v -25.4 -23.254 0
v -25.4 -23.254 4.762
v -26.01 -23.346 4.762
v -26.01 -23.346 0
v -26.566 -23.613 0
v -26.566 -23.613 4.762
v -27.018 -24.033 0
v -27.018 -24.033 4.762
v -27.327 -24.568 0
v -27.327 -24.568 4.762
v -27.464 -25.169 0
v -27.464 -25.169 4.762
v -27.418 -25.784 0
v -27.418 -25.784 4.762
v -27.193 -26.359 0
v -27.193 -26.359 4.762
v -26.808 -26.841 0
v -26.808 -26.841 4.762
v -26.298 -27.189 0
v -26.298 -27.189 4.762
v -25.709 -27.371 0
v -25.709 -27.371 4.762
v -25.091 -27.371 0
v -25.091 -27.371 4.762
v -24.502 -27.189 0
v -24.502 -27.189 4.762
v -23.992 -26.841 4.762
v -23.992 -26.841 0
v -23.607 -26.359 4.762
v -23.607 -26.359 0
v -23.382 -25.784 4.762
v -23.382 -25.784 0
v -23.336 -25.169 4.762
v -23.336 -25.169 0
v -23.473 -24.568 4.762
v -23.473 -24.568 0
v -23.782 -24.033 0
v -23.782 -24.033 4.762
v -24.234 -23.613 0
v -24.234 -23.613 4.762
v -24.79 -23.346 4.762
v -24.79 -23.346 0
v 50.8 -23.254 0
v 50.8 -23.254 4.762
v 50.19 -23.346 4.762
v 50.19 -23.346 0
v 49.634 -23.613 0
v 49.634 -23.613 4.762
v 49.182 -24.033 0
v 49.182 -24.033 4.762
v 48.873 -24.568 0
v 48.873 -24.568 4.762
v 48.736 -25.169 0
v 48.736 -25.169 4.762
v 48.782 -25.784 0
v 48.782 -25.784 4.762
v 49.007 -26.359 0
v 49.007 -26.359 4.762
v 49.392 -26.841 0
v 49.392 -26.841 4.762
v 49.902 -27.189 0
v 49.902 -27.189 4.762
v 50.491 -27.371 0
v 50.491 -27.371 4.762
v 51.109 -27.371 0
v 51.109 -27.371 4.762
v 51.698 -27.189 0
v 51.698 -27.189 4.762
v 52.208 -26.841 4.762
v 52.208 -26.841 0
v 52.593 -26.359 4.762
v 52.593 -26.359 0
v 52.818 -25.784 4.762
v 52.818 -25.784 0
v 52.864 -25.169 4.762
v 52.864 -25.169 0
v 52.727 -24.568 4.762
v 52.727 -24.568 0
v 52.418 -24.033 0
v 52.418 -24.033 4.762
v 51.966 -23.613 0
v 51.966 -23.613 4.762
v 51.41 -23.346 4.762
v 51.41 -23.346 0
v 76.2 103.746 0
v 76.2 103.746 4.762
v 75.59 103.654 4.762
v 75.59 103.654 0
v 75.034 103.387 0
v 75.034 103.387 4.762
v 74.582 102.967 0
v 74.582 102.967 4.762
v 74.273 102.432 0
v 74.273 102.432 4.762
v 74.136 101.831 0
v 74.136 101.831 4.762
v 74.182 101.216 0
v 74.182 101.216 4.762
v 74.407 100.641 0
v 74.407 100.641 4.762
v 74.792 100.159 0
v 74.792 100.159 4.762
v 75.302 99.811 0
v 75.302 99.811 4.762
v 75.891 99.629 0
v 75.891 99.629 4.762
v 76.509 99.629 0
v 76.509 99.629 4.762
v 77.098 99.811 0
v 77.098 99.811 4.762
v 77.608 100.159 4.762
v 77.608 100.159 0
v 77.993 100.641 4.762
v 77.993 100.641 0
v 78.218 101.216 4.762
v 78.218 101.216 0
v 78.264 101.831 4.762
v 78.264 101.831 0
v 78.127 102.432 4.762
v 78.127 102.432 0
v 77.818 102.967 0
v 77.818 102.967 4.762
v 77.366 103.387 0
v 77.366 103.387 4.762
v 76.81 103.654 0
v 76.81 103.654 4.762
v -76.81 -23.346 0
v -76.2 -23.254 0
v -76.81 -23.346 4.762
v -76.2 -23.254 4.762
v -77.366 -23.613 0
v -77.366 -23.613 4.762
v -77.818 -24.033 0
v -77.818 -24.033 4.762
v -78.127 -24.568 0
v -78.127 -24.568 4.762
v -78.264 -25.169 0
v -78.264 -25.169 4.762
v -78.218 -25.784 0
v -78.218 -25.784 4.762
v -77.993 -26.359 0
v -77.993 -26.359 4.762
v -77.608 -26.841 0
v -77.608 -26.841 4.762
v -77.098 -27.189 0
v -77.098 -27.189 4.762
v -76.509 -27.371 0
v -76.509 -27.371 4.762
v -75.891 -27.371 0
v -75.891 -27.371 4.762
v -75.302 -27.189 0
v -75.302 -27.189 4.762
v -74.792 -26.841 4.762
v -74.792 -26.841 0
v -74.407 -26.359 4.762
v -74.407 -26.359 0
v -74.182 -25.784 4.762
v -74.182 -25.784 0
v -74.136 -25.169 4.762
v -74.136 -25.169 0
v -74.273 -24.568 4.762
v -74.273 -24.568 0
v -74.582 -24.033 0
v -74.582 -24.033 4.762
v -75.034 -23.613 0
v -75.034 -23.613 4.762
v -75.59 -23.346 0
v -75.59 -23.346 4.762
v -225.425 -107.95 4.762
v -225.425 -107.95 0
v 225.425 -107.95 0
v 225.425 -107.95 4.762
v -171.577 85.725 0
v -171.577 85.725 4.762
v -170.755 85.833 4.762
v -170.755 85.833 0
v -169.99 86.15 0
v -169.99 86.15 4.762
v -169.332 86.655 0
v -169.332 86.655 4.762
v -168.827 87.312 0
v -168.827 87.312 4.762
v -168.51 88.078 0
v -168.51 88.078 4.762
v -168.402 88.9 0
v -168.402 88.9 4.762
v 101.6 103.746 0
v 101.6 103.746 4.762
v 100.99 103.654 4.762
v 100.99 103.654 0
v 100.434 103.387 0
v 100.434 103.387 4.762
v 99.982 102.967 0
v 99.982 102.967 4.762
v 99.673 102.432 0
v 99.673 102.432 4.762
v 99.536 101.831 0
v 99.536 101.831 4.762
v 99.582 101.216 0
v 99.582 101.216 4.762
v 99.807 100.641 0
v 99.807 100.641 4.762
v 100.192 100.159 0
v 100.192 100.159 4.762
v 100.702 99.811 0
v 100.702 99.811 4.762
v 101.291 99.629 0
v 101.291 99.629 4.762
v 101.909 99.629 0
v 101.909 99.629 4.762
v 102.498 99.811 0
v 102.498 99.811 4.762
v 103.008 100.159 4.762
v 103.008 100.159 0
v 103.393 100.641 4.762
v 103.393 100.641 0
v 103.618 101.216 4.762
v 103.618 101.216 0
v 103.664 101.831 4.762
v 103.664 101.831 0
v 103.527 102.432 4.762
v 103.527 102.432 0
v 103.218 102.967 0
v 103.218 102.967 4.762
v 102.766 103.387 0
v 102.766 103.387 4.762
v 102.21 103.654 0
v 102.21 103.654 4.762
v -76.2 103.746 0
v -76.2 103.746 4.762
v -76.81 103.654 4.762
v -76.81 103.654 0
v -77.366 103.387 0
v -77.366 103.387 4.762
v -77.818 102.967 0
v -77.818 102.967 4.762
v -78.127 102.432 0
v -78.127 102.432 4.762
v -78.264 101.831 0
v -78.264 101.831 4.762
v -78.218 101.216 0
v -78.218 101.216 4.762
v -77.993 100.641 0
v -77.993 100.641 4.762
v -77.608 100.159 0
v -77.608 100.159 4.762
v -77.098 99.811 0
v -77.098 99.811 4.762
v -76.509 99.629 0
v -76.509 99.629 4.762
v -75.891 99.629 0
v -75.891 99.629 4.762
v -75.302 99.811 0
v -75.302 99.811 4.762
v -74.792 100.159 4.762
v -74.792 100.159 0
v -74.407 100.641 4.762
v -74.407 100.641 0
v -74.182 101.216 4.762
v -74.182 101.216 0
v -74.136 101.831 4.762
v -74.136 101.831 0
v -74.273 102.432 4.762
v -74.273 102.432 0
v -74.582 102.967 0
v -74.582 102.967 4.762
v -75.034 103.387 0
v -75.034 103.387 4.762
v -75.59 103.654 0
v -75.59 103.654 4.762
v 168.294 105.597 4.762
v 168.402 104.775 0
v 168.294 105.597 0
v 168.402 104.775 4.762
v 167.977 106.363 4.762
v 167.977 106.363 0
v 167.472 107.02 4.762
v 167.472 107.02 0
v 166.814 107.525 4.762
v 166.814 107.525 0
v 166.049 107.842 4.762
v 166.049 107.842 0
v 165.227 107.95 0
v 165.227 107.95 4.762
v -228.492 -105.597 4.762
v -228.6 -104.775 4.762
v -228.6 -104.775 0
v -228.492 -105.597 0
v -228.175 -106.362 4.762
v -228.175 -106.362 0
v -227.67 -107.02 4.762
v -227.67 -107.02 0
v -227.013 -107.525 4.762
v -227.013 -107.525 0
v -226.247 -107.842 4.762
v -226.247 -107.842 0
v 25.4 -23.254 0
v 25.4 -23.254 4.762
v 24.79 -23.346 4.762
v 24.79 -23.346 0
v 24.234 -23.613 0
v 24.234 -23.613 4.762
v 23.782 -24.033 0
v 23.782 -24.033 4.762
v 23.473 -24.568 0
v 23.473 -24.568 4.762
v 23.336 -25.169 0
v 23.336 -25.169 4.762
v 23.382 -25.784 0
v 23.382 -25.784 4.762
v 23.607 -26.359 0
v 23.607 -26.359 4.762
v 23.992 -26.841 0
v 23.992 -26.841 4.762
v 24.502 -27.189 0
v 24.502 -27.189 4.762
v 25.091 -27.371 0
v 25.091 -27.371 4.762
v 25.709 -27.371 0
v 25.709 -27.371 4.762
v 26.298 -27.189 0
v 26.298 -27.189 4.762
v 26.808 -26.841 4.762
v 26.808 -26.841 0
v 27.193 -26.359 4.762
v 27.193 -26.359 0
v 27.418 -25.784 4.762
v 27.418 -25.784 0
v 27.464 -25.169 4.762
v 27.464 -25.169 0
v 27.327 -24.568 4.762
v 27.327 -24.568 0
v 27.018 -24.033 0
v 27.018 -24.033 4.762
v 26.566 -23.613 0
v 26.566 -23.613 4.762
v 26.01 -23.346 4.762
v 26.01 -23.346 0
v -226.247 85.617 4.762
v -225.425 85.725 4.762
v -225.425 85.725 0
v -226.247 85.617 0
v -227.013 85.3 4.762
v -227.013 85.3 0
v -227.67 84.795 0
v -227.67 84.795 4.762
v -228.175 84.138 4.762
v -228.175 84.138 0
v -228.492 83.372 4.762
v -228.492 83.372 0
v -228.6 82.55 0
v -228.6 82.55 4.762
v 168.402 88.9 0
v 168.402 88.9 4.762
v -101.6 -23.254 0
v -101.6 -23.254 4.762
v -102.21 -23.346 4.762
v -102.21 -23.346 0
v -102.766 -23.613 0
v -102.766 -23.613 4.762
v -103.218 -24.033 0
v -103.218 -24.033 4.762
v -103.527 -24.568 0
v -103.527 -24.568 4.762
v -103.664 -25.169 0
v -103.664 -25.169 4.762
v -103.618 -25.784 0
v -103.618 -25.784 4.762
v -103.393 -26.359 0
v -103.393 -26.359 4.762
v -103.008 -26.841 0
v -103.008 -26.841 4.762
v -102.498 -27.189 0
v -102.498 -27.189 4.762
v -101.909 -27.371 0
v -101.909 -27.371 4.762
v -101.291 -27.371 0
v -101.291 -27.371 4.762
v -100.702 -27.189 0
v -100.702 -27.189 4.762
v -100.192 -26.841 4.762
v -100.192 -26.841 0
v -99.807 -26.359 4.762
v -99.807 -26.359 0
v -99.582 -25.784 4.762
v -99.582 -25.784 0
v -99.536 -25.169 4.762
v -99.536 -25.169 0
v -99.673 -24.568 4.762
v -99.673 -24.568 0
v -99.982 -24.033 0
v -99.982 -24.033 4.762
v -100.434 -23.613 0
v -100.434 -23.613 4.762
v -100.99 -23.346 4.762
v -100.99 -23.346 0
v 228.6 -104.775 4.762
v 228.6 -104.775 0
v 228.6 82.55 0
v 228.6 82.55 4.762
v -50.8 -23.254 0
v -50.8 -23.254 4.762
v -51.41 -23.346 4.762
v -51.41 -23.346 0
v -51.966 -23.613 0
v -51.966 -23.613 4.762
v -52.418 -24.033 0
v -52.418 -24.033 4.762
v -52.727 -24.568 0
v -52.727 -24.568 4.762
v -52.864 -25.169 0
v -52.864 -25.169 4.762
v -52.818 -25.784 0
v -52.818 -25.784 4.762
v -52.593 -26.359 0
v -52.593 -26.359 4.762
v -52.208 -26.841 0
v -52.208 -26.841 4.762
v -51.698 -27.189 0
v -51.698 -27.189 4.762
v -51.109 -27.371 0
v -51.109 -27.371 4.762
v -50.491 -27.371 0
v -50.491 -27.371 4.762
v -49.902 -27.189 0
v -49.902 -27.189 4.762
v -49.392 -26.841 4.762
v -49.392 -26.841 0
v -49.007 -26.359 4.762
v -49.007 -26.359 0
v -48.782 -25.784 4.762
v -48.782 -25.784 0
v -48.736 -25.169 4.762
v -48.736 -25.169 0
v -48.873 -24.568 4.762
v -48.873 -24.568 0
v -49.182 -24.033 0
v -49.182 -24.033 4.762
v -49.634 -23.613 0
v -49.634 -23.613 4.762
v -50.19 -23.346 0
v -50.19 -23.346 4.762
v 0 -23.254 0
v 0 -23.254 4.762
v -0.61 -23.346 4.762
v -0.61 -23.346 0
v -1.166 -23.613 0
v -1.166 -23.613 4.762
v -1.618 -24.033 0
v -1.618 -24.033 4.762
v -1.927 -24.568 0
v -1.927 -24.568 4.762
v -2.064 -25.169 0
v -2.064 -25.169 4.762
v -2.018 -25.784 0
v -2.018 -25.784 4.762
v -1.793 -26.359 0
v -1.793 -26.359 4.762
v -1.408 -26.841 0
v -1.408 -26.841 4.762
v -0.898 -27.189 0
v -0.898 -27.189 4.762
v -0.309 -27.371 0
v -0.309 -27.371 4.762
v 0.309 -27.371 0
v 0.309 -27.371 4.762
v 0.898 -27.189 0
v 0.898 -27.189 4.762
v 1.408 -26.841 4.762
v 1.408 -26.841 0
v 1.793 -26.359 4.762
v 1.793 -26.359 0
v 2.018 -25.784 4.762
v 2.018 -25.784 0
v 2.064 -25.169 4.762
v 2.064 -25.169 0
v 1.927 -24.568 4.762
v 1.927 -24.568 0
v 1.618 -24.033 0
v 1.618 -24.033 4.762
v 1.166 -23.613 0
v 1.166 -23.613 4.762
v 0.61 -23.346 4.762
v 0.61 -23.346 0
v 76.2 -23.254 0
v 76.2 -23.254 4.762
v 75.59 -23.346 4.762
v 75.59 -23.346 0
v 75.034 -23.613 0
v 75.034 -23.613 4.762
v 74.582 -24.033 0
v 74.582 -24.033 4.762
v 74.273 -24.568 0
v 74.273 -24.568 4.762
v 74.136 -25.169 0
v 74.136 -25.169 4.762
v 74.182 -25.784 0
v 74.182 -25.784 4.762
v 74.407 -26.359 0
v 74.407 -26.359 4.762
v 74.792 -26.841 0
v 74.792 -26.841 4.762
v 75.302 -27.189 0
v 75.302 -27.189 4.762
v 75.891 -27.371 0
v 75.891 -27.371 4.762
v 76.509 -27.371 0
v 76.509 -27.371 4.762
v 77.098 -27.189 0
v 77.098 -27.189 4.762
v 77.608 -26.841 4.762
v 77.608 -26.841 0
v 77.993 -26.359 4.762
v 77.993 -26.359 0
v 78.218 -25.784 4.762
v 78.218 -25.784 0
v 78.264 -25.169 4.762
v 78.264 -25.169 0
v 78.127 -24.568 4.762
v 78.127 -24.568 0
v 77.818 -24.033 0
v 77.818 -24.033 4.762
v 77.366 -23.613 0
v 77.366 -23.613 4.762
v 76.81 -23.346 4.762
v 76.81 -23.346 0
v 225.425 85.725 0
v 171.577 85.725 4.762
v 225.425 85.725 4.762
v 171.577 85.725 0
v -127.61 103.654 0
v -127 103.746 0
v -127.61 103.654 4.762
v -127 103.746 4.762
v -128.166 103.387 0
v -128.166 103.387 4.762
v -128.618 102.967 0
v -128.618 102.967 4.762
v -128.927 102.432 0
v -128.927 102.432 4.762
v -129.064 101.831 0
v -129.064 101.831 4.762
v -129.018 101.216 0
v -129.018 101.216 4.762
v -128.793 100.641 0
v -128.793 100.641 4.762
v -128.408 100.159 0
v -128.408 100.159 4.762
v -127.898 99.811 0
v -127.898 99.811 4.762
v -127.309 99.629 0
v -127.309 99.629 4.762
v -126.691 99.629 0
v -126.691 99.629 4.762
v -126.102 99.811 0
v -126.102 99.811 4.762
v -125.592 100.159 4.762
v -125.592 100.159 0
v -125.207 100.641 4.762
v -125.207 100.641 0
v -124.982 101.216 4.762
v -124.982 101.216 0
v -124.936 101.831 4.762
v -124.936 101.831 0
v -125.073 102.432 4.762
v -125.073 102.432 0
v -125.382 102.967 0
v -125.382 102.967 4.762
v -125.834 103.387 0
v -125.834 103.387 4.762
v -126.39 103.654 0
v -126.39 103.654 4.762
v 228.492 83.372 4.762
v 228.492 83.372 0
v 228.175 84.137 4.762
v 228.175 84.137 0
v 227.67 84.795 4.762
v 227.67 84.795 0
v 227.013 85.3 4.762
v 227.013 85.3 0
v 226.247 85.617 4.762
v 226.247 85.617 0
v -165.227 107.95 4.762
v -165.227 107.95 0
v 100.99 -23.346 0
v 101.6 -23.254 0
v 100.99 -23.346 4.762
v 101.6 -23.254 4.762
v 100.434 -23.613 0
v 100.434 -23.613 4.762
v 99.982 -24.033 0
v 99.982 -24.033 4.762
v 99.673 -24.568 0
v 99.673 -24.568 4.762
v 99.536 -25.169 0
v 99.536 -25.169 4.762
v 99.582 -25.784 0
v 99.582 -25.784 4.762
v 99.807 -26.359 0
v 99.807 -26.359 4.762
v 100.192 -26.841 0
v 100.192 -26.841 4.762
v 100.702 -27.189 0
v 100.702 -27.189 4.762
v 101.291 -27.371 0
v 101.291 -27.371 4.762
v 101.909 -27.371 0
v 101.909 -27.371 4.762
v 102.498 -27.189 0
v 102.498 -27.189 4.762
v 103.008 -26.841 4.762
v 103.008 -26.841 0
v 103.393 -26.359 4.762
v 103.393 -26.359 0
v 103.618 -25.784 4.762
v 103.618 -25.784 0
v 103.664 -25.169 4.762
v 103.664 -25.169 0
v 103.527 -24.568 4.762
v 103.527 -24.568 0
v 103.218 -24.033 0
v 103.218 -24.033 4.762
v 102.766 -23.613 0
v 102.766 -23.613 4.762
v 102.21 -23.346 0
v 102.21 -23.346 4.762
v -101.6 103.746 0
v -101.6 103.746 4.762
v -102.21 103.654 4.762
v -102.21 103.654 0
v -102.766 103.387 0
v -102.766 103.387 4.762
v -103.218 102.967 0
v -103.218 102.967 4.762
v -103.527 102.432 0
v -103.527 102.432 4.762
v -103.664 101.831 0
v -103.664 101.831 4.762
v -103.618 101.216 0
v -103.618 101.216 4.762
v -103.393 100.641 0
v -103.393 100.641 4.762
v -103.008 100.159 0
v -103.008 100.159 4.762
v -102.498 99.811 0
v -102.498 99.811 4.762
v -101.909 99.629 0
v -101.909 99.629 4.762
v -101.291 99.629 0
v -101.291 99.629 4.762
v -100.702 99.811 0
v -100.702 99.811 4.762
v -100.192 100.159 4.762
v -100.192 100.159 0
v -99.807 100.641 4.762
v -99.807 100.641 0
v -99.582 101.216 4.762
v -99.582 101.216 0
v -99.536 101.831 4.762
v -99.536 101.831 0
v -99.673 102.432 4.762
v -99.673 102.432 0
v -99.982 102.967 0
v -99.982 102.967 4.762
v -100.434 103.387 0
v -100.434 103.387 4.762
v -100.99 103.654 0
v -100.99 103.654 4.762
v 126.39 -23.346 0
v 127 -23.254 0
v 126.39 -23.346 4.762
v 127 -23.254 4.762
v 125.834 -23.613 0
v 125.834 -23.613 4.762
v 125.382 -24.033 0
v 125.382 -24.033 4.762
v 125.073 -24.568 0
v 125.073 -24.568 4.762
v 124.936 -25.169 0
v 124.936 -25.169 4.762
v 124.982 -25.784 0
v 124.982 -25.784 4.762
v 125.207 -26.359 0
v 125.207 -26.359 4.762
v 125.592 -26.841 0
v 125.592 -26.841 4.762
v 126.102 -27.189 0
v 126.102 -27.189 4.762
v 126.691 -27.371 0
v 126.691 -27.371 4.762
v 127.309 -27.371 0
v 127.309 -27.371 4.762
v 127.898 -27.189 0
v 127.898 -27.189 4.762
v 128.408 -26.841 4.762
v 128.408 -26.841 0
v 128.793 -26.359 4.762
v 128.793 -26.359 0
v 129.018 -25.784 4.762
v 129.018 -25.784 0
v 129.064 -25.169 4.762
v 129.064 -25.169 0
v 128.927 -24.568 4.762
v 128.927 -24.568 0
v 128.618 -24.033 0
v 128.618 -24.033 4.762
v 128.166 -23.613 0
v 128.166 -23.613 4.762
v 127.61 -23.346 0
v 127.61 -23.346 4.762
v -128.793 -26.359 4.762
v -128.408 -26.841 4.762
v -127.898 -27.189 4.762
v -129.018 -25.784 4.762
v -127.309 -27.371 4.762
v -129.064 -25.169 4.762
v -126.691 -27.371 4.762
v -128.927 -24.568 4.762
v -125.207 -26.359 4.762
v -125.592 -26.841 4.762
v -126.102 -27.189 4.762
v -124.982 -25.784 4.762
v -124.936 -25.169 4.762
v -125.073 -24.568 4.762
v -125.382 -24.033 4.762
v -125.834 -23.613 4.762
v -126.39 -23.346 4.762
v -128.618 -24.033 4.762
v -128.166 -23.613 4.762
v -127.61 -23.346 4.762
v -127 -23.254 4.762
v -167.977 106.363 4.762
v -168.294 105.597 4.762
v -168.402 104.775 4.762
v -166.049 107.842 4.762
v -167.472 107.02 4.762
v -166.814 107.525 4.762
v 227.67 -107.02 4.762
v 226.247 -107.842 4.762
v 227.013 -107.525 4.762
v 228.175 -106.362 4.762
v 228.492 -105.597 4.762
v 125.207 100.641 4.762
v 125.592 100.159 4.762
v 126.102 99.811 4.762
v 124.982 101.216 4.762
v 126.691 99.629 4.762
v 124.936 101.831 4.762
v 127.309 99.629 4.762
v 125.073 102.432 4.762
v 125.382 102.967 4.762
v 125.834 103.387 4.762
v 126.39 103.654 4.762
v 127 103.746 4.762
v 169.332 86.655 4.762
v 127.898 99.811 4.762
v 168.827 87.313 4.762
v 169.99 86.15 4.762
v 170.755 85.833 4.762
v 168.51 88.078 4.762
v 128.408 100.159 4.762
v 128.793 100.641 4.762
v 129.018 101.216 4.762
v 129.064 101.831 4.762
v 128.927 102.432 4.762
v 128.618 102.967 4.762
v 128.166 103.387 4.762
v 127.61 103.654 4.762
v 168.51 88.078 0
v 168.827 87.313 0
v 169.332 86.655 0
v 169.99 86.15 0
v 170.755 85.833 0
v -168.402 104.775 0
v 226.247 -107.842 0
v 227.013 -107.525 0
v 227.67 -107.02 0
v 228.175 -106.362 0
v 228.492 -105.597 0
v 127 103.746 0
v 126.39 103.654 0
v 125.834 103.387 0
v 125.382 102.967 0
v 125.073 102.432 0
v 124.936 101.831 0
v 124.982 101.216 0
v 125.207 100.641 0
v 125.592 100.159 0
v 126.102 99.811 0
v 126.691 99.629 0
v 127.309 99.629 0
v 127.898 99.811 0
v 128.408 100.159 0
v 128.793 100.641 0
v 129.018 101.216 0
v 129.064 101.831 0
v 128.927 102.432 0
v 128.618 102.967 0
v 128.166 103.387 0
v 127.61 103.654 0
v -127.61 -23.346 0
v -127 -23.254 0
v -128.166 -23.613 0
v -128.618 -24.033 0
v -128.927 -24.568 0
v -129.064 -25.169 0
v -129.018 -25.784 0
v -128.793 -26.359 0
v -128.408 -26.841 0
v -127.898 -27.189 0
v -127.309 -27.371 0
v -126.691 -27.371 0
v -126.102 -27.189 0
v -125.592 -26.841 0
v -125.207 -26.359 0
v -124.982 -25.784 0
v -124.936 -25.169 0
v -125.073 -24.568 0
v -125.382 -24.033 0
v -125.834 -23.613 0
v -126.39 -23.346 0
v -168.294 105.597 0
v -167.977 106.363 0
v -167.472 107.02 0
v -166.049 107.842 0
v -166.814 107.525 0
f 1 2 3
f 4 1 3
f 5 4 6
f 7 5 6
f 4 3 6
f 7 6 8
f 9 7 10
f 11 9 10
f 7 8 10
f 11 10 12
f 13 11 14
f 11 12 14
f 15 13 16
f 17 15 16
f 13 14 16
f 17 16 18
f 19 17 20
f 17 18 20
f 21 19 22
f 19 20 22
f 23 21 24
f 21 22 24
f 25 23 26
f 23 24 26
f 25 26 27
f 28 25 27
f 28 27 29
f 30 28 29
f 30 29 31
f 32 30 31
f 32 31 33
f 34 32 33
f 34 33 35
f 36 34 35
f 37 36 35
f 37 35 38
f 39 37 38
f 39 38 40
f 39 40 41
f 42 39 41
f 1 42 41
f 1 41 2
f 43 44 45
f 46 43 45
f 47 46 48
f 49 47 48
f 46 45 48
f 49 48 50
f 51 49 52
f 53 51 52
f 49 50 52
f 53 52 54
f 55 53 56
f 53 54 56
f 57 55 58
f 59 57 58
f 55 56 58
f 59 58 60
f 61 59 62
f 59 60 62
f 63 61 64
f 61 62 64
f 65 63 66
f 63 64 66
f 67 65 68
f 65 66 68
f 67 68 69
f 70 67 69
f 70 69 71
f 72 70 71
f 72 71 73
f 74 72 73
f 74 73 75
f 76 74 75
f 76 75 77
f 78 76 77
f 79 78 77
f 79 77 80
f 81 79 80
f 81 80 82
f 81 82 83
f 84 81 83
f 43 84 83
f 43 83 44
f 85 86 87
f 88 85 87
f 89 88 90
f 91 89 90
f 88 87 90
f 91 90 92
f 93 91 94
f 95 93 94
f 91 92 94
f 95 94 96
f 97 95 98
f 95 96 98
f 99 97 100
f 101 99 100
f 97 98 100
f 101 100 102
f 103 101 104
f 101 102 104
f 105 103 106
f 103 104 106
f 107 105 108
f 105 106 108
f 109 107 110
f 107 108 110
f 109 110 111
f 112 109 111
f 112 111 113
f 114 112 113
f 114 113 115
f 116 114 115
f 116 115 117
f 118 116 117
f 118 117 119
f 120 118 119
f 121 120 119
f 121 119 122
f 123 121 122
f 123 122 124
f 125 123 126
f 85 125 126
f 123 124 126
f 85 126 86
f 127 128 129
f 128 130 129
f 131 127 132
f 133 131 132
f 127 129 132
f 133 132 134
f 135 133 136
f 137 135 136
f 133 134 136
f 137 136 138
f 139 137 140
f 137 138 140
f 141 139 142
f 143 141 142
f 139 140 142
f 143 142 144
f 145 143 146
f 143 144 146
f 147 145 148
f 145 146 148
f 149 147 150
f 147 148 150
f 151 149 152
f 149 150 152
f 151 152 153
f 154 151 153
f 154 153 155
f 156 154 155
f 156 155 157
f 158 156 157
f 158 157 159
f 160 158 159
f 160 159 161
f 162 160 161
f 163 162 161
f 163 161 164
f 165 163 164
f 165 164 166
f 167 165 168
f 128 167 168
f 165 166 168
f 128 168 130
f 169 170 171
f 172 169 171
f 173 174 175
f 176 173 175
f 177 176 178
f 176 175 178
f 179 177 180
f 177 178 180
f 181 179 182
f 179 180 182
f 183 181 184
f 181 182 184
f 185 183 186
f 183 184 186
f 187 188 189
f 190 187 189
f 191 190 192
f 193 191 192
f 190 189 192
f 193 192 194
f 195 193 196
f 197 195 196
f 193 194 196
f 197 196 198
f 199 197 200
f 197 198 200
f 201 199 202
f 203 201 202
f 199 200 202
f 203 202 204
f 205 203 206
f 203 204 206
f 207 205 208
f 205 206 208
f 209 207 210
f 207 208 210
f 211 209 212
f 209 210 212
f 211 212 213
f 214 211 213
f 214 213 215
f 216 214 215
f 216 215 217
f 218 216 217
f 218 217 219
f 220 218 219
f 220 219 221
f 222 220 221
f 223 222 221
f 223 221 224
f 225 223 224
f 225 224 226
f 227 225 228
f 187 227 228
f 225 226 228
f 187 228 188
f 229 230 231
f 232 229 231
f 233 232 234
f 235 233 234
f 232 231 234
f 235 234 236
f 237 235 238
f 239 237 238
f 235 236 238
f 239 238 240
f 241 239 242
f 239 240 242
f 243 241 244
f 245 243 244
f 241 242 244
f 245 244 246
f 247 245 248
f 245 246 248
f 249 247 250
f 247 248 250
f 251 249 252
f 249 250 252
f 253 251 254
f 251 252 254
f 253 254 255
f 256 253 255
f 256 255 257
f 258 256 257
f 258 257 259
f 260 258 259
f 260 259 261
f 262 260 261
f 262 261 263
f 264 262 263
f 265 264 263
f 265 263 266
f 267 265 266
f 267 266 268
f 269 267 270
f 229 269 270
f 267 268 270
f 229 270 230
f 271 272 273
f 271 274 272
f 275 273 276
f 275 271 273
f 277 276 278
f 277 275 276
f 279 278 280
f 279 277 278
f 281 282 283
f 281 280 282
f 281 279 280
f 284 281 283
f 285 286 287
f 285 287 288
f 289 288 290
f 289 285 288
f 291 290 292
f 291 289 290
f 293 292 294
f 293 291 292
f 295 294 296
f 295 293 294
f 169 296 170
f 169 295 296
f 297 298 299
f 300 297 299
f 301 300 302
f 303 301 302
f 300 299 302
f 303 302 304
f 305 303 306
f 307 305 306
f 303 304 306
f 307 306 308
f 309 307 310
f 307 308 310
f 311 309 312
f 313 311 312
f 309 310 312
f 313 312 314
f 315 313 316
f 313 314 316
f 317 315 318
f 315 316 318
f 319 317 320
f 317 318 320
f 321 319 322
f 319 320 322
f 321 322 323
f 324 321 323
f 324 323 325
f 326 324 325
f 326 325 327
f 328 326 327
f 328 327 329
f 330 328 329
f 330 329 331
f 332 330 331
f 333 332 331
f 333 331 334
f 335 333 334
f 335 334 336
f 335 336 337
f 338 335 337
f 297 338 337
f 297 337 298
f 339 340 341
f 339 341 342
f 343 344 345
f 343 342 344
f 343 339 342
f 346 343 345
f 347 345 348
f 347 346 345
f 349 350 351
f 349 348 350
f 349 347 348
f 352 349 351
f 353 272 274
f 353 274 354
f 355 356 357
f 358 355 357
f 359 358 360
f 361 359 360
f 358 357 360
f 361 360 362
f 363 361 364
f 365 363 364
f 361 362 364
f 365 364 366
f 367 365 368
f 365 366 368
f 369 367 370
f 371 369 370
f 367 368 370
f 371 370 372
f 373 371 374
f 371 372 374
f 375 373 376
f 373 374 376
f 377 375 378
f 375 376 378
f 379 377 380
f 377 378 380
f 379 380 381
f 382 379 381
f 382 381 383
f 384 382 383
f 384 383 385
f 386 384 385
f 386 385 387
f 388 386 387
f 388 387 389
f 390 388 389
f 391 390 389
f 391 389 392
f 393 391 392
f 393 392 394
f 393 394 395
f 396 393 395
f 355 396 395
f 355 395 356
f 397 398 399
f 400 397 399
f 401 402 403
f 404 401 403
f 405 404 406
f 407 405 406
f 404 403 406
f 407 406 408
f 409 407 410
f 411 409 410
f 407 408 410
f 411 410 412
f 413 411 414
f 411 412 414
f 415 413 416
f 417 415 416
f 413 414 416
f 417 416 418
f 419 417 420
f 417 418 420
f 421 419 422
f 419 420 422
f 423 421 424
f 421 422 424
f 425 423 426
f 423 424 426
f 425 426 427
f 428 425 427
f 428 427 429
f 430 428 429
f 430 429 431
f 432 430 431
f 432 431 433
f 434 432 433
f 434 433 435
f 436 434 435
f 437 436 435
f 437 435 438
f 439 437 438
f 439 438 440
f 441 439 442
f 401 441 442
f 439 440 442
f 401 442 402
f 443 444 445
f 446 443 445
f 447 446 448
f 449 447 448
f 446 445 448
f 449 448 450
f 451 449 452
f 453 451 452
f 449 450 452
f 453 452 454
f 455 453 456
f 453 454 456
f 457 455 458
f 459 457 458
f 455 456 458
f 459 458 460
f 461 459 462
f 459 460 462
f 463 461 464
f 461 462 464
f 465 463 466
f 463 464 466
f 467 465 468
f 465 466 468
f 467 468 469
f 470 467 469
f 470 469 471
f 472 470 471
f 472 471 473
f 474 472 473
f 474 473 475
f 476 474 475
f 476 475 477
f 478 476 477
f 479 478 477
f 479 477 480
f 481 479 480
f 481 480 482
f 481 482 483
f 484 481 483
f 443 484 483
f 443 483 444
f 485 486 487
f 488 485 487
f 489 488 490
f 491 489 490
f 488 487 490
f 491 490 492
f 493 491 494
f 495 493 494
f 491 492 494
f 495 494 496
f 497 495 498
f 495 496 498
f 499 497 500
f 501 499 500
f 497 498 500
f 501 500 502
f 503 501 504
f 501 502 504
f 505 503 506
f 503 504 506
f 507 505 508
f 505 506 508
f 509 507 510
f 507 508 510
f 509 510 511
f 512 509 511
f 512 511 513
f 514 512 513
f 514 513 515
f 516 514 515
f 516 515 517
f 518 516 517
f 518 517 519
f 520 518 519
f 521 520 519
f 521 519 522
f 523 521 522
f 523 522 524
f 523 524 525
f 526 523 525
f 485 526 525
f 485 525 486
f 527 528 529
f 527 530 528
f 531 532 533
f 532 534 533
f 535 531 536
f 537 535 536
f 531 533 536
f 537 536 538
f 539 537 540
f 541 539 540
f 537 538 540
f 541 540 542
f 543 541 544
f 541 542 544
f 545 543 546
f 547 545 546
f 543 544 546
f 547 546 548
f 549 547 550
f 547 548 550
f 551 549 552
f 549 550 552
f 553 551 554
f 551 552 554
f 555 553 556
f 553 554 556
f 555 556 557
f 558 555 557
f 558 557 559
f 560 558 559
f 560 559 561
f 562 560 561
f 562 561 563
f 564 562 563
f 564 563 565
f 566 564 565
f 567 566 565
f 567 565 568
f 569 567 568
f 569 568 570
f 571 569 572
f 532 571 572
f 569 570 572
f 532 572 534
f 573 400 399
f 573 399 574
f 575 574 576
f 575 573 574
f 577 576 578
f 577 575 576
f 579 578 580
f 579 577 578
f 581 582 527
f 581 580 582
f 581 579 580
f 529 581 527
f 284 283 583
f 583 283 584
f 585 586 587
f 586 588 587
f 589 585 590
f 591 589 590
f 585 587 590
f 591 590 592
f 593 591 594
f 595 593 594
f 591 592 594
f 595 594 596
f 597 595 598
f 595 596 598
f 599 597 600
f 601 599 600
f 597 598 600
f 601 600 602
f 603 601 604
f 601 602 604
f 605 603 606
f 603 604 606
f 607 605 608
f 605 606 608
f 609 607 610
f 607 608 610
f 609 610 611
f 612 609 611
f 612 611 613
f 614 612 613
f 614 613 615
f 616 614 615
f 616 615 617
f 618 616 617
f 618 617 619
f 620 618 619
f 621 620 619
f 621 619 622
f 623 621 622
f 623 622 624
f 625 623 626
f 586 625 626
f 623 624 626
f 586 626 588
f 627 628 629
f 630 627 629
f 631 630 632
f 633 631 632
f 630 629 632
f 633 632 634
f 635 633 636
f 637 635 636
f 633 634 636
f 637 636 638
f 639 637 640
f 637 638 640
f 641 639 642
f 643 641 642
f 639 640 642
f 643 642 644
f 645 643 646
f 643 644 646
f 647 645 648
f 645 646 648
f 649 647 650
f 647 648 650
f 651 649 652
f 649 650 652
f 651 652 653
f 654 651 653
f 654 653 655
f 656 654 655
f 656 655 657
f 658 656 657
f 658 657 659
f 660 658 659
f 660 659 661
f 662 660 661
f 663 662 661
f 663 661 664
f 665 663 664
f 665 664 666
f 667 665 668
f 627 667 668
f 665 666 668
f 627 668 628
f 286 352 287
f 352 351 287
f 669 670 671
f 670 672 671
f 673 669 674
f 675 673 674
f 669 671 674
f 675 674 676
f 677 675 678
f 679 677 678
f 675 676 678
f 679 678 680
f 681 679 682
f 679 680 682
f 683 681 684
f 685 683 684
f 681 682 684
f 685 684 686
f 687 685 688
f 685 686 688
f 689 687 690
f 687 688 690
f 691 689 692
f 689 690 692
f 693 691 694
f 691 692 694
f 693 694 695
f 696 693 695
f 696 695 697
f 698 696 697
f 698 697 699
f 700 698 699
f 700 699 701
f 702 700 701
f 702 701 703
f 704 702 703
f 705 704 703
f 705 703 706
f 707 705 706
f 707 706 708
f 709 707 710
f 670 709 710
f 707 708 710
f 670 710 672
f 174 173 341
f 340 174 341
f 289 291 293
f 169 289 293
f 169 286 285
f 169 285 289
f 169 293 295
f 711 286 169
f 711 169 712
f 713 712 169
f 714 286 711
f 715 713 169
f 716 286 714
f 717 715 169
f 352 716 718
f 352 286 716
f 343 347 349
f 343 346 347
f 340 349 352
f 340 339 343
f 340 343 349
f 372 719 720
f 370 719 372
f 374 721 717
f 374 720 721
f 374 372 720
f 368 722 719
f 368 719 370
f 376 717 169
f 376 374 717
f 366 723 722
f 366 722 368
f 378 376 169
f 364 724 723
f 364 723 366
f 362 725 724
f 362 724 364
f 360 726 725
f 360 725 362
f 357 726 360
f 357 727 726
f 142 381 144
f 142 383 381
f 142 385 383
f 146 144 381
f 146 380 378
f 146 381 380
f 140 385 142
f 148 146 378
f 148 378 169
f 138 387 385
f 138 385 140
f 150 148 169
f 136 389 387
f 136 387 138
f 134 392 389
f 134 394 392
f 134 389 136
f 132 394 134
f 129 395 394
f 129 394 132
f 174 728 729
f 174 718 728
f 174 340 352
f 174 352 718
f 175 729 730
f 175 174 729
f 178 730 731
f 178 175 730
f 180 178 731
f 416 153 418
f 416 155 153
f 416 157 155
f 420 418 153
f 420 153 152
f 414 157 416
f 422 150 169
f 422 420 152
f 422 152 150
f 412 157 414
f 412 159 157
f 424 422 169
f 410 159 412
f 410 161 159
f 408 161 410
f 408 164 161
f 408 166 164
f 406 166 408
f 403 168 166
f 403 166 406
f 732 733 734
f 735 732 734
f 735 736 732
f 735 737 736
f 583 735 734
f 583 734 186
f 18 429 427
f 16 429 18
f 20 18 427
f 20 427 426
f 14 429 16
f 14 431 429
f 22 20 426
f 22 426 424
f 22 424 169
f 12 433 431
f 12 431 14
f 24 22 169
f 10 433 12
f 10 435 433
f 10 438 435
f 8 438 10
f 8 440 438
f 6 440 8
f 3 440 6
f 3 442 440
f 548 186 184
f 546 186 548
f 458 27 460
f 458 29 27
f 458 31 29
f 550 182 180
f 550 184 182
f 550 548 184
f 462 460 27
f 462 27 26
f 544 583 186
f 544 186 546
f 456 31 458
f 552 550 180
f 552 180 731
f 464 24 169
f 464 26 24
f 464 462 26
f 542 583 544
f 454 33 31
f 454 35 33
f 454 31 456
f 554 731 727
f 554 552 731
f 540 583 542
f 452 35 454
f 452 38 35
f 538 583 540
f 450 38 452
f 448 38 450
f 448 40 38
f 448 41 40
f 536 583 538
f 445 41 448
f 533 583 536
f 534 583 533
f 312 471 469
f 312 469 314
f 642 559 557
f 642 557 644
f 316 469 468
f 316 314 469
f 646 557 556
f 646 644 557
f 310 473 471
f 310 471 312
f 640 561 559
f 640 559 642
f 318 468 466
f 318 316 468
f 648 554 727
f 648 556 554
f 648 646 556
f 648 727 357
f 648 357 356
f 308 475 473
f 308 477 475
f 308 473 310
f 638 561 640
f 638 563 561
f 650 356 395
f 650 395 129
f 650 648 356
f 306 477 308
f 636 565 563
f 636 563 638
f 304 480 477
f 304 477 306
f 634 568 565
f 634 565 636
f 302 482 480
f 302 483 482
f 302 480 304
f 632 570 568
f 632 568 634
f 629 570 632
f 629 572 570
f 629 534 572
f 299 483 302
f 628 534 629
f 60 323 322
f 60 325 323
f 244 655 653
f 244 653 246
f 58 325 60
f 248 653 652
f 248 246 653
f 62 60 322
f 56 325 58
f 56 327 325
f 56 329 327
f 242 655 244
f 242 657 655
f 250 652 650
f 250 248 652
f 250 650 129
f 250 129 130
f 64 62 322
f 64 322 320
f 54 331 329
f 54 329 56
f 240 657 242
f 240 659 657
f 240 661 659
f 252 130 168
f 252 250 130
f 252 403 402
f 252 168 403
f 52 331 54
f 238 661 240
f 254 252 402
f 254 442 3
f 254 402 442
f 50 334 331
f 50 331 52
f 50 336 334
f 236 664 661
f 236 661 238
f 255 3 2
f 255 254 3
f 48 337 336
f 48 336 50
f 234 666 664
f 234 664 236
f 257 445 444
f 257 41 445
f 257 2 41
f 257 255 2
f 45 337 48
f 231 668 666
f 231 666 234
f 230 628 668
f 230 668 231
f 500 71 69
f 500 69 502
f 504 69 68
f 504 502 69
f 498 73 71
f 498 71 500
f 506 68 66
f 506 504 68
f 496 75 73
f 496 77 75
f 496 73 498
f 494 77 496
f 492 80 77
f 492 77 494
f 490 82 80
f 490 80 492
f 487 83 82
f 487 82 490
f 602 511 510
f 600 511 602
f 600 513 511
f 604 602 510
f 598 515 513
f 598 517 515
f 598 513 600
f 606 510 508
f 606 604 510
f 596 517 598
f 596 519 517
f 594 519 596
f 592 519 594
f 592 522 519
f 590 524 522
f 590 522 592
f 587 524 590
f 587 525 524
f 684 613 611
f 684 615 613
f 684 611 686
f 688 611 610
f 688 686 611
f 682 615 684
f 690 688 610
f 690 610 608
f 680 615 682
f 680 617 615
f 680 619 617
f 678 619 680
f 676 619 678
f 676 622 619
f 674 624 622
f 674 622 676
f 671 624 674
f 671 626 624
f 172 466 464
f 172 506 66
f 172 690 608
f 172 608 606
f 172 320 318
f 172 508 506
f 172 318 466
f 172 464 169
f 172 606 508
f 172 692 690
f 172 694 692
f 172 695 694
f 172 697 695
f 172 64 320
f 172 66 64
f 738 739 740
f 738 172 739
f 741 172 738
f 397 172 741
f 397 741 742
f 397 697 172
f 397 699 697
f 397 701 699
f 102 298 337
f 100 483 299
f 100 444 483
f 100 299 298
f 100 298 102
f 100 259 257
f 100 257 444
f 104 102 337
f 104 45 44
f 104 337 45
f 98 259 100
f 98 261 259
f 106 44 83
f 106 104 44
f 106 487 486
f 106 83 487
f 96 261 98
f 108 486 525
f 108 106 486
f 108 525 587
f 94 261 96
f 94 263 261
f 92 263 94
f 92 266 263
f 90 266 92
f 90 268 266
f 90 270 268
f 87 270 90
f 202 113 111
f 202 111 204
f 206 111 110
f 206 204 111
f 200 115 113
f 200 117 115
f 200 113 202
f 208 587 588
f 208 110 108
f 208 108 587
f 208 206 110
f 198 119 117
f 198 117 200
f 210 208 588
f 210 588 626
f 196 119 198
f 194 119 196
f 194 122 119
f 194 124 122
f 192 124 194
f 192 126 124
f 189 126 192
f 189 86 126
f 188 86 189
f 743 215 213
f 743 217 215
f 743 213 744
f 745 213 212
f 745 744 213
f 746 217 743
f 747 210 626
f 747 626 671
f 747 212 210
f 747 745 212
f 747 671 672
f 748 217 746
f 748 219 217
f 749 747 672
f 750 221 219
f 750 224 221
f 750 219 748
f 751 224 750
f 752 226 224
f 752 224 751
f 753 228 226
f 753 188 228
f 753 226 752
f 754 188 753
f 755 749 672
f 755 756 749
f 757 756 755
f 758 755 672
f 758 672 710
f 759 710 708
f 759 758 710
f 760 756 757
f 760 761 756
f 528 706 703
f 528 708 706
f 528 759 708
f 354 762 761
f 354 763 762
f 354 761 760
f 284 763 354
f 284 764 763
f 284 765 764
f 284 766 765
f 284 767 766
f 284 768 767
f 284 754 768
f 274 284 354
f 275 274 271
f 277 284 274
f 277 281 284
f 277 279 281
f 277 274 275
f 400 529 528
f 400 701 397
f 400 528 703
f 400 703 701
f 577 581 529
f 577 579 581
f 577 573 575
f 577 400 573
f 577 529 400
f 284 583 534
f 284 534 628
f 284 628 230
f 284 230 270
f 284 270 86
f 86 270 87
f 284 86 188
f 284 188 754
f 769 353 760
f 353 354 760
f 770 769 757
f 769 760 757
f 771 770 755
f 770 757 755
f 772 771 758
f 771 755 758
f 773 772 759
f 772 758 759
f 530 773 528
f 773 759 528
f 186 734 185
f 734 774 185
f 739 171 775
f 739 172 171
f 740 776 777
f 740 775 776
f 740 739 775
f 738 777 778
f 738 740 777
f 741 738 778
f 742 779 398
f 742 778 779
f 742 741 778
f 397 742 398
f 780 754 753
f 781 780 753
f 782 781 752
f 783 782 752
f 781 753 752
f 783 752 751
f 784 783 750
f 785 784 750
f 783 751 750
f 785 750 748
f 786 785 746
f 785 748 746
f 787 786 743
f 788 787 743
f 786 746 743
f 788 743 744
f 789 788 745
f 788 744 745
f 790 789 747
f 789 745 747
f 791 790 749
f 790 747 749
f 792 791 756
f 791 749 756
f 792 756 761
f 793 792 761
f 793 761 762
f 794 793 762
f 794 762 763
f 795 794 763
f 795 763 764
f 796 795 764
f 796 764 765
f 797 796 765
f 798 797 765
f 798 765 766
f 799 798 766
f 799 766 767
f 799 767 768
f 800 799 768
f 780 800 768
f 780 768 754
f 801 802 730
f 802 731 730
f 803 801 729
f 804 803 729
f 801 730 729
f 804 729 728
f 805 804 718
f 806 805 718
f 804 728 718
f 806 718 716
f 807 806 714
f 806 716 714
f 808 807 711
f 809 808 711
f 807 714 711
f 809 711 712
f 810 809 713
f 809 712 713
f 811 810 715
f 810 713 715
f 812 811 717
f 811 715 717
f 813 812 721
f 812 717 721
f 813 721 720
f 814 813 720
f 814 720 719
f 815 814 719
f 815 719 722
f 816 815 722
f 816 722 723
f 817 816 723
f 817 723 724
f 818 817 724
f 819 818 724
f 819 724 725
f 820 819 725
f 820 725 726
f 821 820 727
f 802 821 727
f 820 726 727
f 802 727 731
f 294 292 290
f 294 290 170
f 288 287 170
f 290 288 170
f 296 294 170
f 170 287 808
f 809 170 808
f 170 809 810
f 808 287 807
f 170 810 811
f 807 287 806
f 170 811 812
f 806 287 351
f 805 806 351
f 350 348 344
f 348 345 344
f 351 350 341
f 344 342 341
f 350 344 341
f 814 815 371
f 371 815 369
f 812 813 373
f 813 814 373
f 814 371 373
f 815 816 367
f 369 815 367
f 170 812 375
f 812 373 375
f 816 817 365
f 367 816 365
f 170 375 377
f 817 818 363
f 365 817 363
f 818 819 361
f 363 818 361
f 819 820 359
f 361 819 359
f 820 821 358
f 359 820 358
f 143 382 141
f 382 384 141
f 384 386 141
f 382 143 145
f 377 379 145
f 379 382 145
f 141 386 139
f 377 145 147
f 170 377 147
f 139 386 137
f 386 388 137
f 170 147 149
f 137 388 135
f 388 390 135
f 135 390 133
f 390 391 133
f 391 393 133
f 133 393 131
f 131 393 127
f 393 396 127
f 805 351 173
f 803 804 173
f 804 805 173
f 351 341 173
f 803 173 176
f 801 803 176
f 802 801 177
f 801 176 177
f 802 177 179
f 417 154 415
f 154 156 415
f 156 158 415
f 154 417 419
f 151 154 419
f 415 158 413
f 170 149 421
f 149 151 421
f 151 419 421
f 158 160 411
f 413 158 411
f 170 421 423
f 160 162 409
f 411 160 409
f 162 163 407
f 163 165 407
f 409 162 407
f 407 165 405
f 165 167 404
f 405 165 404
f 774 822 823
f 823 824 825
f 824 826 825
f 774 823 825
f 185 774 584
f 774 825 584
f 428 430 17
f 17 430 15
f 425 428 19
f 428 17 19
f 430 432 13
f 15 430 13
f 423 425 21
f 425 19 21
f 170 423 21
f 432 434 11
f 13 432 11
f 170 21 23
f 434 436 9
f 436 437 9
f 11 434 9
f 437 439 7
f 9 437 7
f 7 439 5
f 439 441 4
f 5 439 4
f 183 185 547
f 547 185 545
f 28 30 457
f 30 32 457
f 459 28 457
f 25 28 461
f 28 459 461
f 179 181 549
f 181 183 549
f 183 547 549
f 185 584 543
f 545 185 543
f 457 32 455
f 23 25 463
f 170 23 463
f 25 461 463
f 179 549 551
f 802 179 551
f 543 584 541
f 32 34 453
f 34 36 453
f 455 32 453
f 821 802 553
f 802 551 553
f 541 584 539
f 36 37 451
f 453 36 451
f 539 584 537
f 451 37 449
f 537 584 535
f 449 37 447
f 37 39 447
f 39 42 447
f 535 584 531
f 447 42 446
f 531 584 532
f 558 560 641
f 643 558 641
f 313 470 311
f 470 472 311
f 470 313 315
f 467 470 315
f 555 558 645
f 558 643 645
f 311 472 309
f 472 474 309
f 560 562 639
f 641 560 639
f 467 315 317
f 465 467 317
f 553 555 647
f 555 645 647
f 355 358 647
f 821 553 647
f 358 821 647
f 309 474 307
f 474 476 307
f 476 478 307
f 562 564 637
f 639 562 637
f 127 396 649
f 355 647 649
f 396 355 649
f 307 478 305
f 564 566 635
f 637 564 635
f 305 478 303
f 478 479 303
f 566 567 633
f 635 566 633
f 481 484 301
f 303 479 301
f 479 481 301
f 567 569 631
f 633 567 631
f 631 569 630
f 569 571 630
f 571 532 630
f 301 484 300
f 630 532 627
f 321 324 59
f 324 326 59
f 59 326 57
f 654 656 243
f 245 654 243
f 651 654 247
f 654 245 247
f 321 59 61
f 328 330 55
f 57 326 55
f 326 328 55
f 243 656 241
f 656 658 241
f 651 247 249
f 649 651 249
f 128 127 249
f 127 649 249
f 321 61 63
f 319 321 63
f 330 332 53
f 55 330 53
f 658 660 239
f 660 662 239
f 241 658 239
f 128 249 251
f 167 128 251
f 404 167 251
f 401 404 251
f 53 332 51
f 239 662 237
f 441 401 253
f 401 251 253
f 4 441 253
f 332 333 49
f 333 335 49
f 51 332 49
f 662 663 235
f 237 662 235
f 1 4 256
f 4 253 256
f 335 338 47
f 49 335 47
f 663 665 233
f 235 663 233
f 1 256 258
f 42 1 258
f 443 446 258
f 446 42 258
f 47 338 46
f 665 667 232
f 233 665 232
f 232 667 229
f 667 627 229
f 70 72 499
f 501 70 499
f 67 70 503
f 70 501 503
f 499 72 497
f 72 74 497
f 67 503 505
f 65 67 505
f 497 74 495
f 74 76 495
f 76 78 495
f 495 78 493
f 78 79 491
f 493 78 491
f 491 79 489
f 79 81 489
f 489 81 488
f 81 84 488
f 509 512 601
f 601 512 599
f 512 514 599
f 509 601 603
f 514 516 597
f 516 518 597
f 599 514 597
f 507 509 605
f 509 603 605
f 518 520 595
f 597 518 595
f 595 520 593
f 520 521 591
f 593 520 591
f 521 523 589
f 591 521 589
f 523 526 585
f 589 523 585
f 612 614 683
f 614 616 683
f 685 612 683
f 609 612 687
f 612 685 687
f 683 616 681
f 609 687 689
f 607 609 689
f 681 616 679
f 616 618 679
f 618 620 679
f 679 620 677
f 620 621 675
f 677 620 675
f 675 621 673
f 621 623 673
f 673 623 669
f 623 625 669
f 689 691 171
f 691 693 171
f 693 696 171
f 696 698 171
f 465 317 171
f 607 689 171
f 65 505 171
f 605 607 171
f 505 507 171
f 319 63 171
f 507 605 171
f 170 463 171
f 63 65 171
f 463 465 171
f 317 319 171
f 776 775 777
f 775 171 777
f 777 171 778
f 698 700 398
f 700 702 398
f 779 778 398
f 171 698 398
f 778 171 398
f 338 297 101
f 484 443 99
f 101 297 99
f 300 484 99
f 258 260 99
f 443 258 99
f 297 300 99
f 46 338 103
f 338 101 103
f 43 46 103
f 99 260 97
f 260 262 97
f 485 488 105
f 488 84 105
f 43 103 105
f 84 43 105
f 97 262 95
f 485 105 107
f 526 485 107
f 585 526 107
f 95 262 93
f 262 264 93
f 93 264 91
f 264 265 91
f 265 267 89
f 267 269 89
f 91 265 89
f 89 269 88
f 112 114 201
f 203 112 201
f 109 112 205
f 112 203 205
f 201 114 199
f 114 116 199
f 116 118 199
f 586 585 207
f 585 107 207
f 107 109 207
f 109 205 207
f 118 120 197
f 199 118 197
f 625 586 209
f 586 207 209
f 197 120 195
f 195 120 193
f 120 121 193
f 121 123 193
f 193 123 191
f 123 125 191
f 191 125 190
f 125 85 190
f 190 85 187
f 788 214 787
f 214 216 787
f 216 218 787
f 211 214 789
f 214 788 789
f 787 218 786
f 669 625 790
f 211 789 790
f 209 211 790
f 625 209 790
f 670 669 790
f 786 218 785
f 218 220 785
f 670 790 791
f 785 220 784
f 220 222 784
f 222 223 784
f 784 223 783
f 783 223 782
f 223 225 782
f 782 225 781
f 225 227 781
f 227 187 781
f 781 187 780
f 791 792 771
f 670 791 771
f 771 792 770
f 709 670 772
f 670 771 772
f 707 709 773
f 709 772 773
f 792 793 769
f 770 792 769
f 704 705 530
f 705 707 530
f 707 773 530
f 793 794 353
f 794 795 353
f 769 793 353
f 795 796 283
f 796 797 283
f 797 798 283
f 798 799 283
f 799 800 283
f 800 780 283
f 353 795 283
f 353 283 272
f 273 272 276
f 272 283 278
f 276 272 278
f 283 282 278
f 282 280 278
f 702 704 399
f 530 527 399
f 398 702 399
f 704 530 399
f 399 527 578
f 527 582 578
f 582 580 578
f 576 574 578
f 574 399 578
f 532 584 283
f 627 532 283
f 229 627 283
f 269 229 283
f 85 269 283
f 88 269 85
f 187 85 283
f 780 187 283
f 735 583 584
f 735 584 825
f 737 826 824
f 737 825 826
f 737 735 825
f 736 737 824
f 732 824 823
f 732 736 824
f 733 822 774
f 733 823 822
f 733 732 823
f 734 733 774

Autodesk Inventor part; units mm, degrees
ref_plane "YZ Plane" through (0, 0, 0) normal (1, 0, 0) x (0, 1, 0)
ref_plane "XZ Plane" through (0, 0, 0) normal (0, 1, 0) x (-1, 0, 0)
ref_plane "XY Plane" through (0, 0, 0) normal (0, 0, 1) x (1, 0, 0)
sketch "Sketch1" plane through (0, 0, 0) normal (0, 0, 1) x (1, 0, 0)
  line L0 (-228.6, -107.95) -> (228.6, -107.95)
  line L1 (168.402, 107.95) -> (-168.402, 107.95)
  line L2 (-171.577, 91.059) -> (-171.577, 109.9058) projected
  line L3 (-171.577, 91.059) -> (-173.736, 88.9) projected
  line L4 (-232.664, 88.9) -> (-173.736, 88.9) projected
  line L5 (-232.664, 88.9) -> (-234.823, 91.059) projected
  line L6 (-234.823, 109.9058) -> (-234.823, 91.059) projected
  line L7 (-171.577, 109.9058) -> (-234.823, 109.9058) projected
  circle A0 centre (-177.8, 101.6) radius 2.0701 projected
  circle A1 centre (-190.5, 101.6) radius 2.0701 projected
  circle A2 centre (-203.2, 101.6) radius 2.0701 projected
  circle A3 centre (-215.9, 101.6) radius 2.0701 projected
  circle A4 centre (-228.6, 101.6) radius 2.0701 projected
  line L8 (234.823, 109.9058) -> (234.823, 91.059) projected
  line L9 (234.823, 91.059) -> (232.664, 88.9) projected
  line L10 (173.736, 88.9) -> (232.664, 88.9) projected
  line L11 (173.736, 88.9) -> (171.577, 91.059) projected
  line L12 (171.577, 109.9058) -> (171.577, 91.059) projected
  line L13 (234.823, 109.9058) -> (171.577, 109.9058) projected
  circle A5 centre (177.8, 101.6) radius 2.0701 projected
  circle A6 centre (190.5, 101.6) radius 2.0701 projected
  circle A7 centre (203.2, 101.6) radius 2.0701 projected
  circle A8 centre (215.9, 101.6) radius 2.0701 projected
  circle A9 centre (228.6, 101.6) radius 2.0701 projected
  line L14 (168.402, 107.95) -> (168.402, 85.725)
  line L15 (168.402, 85.725) -> (228.6, 85.725)
  line L16 (-168.402, 107.95) -> (-168.402, 85.725)
  line L17 (-168.402, 85.725) -> (-228.6, 85.725)
  line L18 (-228.6, 85.725) -> (-228.6, -107.95)
  line L19 (228.6, -107.95) -> (228.6, 85.725)
  point P0 (0, 0)
  dimension "d4" = 3.175
  dimension "d5" = 3.175
  dimension "d6" = 3.175
  dimension "d7" = 3.175
  dimension "d8" = 457.2
  dimension "d9" = 215.9
extrude "Extrusion1" add sketch "Sketch1" along normal blind 4.7625 contours L18 L17 L16 L1 L14 L15 L19 L0
fillet "Fillet1" radius 3.175 8 edges at (228.6, -107.95, 2.3813) (168.402, 107.95, 2.3813) (168.402, 85.725, 2.3813) (228.6, 85.725, 2.3813) (-168.402, 107.95, 2.3813) (-168.402, 85.725, 2.3813) (-228.6, 85.725, 2.3813) (-228.6, -107.95, 2.3813)
sketch "Sketch2" plane through (0, 0, 0) normal (0, 0, -1) x (-1, 0, 0)
  arc A0 (103.6687, -25.2476) -> (99.5313, -25.2476) centre (101.6, -25.3238) ccw projected
  line L0 (78.2687, -25.2476) -> (99.5313, -25.2476) projected
  arc A1 (78.2687, -25.2476) -> (74.1313, -25.2476) centre (76.2, -25.3238) ccw projected
  line L1 (52.8687, -25.2476) -> (74.1313, -25.2476) projected
  arc A2 (52.8687, -25.2476) -> (48.7313, -25.2476) centre (50.8, -25.3238) ccw projected
  line L2 (27.4687, -25.2476) -> (48.7313, -25.2476) projected
  arc A3 (27.4687, -25.2476) -> (23.3313, -25.2476) centre (25.4, -25.3238) ccw projected
  line L3 (2.0687, -25.2476) -> (23.3313, -25.2476) projected
  arc A4 (2.0687, -25.2476) -> (-2.0687, -25.2476) centre (0, -25.3238) ccw projected
  line L4 (-23.3313, -25.2476) -> (-2.0687, -25.2476) projected
  arc A5 (-23.3313, -25.2476) -> (-27.4687, -25.2476) centre (-25.4, -25.3238) ccw projected
  line L5 (-48.7313, -25.2476) -> (-27.4687, -25.2476) projected
  arc A6 (-48.7313, -25.2476) -> (-52.8687, -25.2476) centre (-50.8, -25.3238) ccw projected
  line L6 (-74.1313, -25.2476) -> (-52.8687, -25.2476) projected
  arc A7 (-74.1313, -25.2476) -> (-78.2687, -25.2476) centre (-76.2, -25.3238) ccw projected
  line L7 (-99.5313, -25.2476) -> (-78.2687, -25.2476) projected
  arc A8 (-99.5313, -25.2476) -> (-103.6687, -25.2476) centre (-101.6, -25.3238) ccw projected
  line L8 (-124.9313, -25.2476) -> (-103.6687, -25.2476) projected
  arc A9 (-124.9313, -25.2476) -> (-129.0687, -25.2476) centre (-127, -25.3238) ccw projected
  line L9 (-355.6, -25.2476) -> (-129.0687, -25.2476) projected
  line L10 (-355.6, -12.6238) -> (-355.6, -25.2476) projected
  line L11 (355.6, -12.6238) -> (-355.6, -12.6238) projected
  line L12 (355.6, -25.2476) -> (355.6, -12.6238) projected
  line L13 (129.0687, -25.2476) -> (355.6, -25.2476) projected
  arc A10 (129.0687, -25.2476) -> (124.9313, -25.2476) centre (127, -25.3238) ccw projected
  line L14 (103.6687, -25.2476) -> (124.9313, -25.2476) projected
  arc A11 (-99.5313, 101.7524) -> (-103.6687, 101.7524) centre (-101.6, 101.6762) ccw projected
  line L15 (-124.9313, 101.7524) -> (-103.6687, 101.7524) projected
  arc A12 (-124.9313, 101.7524) -> (-129.0687, 101.7524) centre (-127, 101.6762) ccw projected
  line L16 (-175.7355, 101.7524) -> (-129.0687, 101.7524) projected
  arc A13 (-175.7355, 101.7524) -> (-179.8645, 101.7524) centre (-177.8, 101.6) ccw projected
  line L17 (-188.4355, 101.7524) -> (-179.8645, 101.7524) projected
  arc A14 (-188.4355, 101.7524) -> (-192.5645, 101.7524) centre (-190.5, 101.6) ccw projected
  line L18 (-201.1355, 101.7524) -> (-192.5645, 101.7524) projected
  arc A15 (-201.1355, 101.7524) -> (-205.2645, 101.7524) centre (-203.2, 101.6) ccw projected
  line L19 (-213.8355, 101.7524) -> (-205.2645, 101.7524) projected
  arc A16 (-213.8355, 101.7524) -> (-217.9645, 101.7524) centre (-215.9, 101.6) ccw projected
  line L20 (-226.5355, 101.7524) -> (-217.9645, 101.7524) projected
  arc A17 (-226.5355, 101.7524) -> (-230.6645, 101.7524) centre (-228.6, 101.6) ccw projected
  line L21 (-355.6, 101.7524) -> (-230.6645, 101.7524) projected
  line L22 (-355.6, 114.3) -> (-355.6, 101.7524) projected
  line L23 (355.6, 114.3) -> (-355.6, 114.3) projected
  line L24 (355.6, 101.7524) -> (355.6, 114.3) projected
  line L25 (230.6645, 101.7524) -> (355.6, 101.7524) projected
  arc A18 (230.6645, 101.7524) -> (226.5355, 101.7524) centre (228.6, 101.6) ccw projected
  line L26 (217.9645, 101.7524) -> (226.5355, 101.7524) projected
  arc A19 (217.9645, 101.7524) -> (213.8355, 101.7524) centre (215.9, 101.6) ccw projected
  line L27 (205.2645, 101.7524) -> (213.8355, 101.7524) projected
  arc A20 (205.2645, 101.7524) -> (201.1355, 101.7524) centre (203.2, 101.6) ccw projected
  line L28 (192.5645, 101.7524) -> (201.1355, 101.7524) projected
  arc A21 (192.5645, 101.7524) -> (188.4355, 101.7524) centre (190.5, 101.6) ccw projected
  line L29 (179.8645, 101.7524) -> (188.4355, 101.7524) projected
  arc A22 (179.8645, 101.7524) -> (175.7355, 101.7524) centre (177.8, 101.6) ccw projected
  line L30 (129.0687, 101.7524) -> (175.7355, 101.7524) projected
  arc A23 (129.0687, 101.7524) -> (124.9313, 101.7524) centre (127, 101.6762) ccw projected
  line L31 (103.6687, 101.7524) -> (124.9313, 101.7524) projected
  arc A24 (103.6687, 101.7524) -> (99.5313, 101.7524) centre (101.6, 101.6762) ccw projected
  line L32 (78.2687, 101.7524) -> (99.5313, 101.7524) projected
  arc A25 (78.2687, 101.7524) -> (74.1313, 101.7524) centre (76.2, 101.6762) ccw projected
  line L33 (64.0989, 101.7524) -> (74.1313, 101.7524) projected
  spline S0 degree 2 poles (64.0989, 101.7524) (63.534, 102.6488) (62.8722, 103.4567) knots 1.72164 1.72164 1.72164 2 2 2 projected
  spline S1 degree 2 poles (62.8722, 103.4567) (60.4022, 106.3898) (53.1156, 109.5391) (47.8051, 109.5391) knots 0 0 0 1 2 2 2 projected
  spline S2 degree 2 poles (47.8051, 109.5391) (46.0143, 109.5391) (42.1241, 109.076) (41.4757, 108.8907) knots 0 0 0 1 2 2 2 projected
  line L34 (41.4757, 108.8907) -> (41.4757, 101.7524) projected
  line L35 (33.0922, 101.7524) -> (41.4757, 101.7524) projected
  spline S3 degree 2 poles (33.0922, 101.7524) (32.0797, 104.0718) (30.2062, 105.7723) knots 1.066482 1.066482 1.066482 2 2 2 projected
  spline S4 degree 2 poles (30.2062, 105.7723) (28.1994, 107.5939) (22.7036, 109.6008) (18.6898, 109.6008) knots 0 0 0 1 2 2 2 projected
  spline S5 degree 2 poles (18.6898, 109.6008) (14.429, 109.57) (8.3157, 108.1806) (6.3088, 107.2852) knots 0 0 0 1 2 2 2 projected
  line L36 (6.3088, 107.2852) -> (6.3088, 101.7524) projected
  line L37 (-0.2839, 101.7524) -> (6.3088, 101.7524) projected
  spline S6 degree 2 poles (-0.2839, 101.7524) (-1.2964, 104.0718) (-3.1699, 105.7723) knots 1.066482 1.066482 1.066482 2 2 2 projected
  spline S7 degree 2 poles (-3.1699, 105.7723) (-5.1767, 107.5939) (-10.6725, 109.6008) (-14.6863, 109.6008) knots 0 0 0 1 2 2 2 projected
  spline S8 degree 2 poles (-14.6863, 109.6008) (-18.9471, 109.57) (-25.0604, 108.1806) (-27.0673, 107.2852) knots 0 0 0 1 2 2 2 projected
  line L38 (-27.0673, 107.2852) -> (-27.0673, 101.7524) projected
  line L39 (-41.1772, 101.7524) -> (-27.0673, 101.7524) projected
  line L40 (-41.1772, 101.7524) -> (-41.1772, 102.1599) projected
  line L41 (-41.1772, 102.1599) -> (-33.3349, 102.1599) projected
  line L42 (-33.3349, 102.1599) -> (-33.3349, 108.7981) projected
  line L43 (-33.3349, 108.7981) -> (-58.4982, 108.7981) projected
  line L44 (-58.4982, 108.7981) -> (-58.4982, 102.1599) projected
  line L45 (-58.4982, 102.1599) -> (-50.4707, 102.1599) projected
  line L46 (-50.4707, 102.1599) -> (-50.4707, 101.7524) projected
  line L47 (-74.1313, 101.7524) -> (-50.4707, 101.7524) projected
  arc A26 (-74.1313, 101.7524) -> (-78.2687, 101.7524) centre (-76.2, 101.6762) ccw projected
  line L48 (-99.5313, 101.7524) -> (-78.2687, 101.7524) projected
  point P0 (0, 0)
hole "Hole1" at (-127, 101.6762, 0) at (-101.6, 101.6762, 0) at (-76.2, 101.6762, 0) at (76.2, 101.6762, 0) at (101.6, 101.6762, 0) at (127, 101.6762, 0) at (-127, -25.3238, 0) at (-101.6, -25.3238, 0) at (-76.2, -25.3238, 0) at (-50.8, -25.3238, 0) at (-25.4, -25.3238, 0) at (0, -25.3238, 0) at (25.4, -25.3238, 0) at (50.8, -25.3238, 0) at (76.2, -25.3238, 0) at (101.6, -25.3238, 0) at (127, -25.3238, 0) direction (0, 0, 1) diameter 4.1402 end through all
sketch "Sketch4" plane through (0, 0, 0) normal (0, 0, -1) x (-1, 0, 0)
  line L0 (-165.227, 107.95) -> (165.227, 107.95) projected
  line L1 (107.95, -107.95) -> (-107.95, -107.95) construction
  line L2 (-107.95, -107.95) -> (-107.95, 107.95) construction
  line L3 (-107.95, 107.95) -> (107.95, 107.95) construction
  line L4 (107.95, 107.95) -> (107.95, -107.95) construction
  line L5 (197.0019, -39.6304) -> (129.4704, -39.6304) construction
  line L6 (129.4704, -39.6304) -> (129.4704, 38.94) construction
  line L7 (129.4704, 38.94) -> (197.0019, 38.94) construction
  line L8 (197.0019, 38.94) -> (197.0019, -39.6304) construction
  line L9 (-125.3858, -27.2271) -> (-180.4191, -27.2271) construction
  line L10 (-180.4191, -27.2271) -> (-180.4191, 36.8021) construction
  line L11 (-180.4191, 36.8021) -> (-125.3858, 36.8021) construction
  line L12 (-125.3858, 36.8021) -> (-125.3858, -27.2271) construction
  line L13 (-51.4537, 12.8385) -> (-125.3858, 12.8385) construction
  line L14 (-125.3858, 12.8385) -> (-125.3858, -68.9649) construction
  line L15 (-125.3858, -68.9649) -> (-51.4537, -68.9649) construction
  line L16 (-51.4537, -68.9649) -> (-51.4537, 12.8385) construction
  line L17 (225.425, -107.95) -> (-225.425, -107.95) projected
  line L18 (-228.6, -104.775) -> (-228.6, 82.55) projected
  point P0 (0, 0)
decal "Decal1"
decal "Decal2"
decal "Decal3"
properties part number "C17_TK_VerticalElectricBoard" material "Polycarbonate, Clear"
